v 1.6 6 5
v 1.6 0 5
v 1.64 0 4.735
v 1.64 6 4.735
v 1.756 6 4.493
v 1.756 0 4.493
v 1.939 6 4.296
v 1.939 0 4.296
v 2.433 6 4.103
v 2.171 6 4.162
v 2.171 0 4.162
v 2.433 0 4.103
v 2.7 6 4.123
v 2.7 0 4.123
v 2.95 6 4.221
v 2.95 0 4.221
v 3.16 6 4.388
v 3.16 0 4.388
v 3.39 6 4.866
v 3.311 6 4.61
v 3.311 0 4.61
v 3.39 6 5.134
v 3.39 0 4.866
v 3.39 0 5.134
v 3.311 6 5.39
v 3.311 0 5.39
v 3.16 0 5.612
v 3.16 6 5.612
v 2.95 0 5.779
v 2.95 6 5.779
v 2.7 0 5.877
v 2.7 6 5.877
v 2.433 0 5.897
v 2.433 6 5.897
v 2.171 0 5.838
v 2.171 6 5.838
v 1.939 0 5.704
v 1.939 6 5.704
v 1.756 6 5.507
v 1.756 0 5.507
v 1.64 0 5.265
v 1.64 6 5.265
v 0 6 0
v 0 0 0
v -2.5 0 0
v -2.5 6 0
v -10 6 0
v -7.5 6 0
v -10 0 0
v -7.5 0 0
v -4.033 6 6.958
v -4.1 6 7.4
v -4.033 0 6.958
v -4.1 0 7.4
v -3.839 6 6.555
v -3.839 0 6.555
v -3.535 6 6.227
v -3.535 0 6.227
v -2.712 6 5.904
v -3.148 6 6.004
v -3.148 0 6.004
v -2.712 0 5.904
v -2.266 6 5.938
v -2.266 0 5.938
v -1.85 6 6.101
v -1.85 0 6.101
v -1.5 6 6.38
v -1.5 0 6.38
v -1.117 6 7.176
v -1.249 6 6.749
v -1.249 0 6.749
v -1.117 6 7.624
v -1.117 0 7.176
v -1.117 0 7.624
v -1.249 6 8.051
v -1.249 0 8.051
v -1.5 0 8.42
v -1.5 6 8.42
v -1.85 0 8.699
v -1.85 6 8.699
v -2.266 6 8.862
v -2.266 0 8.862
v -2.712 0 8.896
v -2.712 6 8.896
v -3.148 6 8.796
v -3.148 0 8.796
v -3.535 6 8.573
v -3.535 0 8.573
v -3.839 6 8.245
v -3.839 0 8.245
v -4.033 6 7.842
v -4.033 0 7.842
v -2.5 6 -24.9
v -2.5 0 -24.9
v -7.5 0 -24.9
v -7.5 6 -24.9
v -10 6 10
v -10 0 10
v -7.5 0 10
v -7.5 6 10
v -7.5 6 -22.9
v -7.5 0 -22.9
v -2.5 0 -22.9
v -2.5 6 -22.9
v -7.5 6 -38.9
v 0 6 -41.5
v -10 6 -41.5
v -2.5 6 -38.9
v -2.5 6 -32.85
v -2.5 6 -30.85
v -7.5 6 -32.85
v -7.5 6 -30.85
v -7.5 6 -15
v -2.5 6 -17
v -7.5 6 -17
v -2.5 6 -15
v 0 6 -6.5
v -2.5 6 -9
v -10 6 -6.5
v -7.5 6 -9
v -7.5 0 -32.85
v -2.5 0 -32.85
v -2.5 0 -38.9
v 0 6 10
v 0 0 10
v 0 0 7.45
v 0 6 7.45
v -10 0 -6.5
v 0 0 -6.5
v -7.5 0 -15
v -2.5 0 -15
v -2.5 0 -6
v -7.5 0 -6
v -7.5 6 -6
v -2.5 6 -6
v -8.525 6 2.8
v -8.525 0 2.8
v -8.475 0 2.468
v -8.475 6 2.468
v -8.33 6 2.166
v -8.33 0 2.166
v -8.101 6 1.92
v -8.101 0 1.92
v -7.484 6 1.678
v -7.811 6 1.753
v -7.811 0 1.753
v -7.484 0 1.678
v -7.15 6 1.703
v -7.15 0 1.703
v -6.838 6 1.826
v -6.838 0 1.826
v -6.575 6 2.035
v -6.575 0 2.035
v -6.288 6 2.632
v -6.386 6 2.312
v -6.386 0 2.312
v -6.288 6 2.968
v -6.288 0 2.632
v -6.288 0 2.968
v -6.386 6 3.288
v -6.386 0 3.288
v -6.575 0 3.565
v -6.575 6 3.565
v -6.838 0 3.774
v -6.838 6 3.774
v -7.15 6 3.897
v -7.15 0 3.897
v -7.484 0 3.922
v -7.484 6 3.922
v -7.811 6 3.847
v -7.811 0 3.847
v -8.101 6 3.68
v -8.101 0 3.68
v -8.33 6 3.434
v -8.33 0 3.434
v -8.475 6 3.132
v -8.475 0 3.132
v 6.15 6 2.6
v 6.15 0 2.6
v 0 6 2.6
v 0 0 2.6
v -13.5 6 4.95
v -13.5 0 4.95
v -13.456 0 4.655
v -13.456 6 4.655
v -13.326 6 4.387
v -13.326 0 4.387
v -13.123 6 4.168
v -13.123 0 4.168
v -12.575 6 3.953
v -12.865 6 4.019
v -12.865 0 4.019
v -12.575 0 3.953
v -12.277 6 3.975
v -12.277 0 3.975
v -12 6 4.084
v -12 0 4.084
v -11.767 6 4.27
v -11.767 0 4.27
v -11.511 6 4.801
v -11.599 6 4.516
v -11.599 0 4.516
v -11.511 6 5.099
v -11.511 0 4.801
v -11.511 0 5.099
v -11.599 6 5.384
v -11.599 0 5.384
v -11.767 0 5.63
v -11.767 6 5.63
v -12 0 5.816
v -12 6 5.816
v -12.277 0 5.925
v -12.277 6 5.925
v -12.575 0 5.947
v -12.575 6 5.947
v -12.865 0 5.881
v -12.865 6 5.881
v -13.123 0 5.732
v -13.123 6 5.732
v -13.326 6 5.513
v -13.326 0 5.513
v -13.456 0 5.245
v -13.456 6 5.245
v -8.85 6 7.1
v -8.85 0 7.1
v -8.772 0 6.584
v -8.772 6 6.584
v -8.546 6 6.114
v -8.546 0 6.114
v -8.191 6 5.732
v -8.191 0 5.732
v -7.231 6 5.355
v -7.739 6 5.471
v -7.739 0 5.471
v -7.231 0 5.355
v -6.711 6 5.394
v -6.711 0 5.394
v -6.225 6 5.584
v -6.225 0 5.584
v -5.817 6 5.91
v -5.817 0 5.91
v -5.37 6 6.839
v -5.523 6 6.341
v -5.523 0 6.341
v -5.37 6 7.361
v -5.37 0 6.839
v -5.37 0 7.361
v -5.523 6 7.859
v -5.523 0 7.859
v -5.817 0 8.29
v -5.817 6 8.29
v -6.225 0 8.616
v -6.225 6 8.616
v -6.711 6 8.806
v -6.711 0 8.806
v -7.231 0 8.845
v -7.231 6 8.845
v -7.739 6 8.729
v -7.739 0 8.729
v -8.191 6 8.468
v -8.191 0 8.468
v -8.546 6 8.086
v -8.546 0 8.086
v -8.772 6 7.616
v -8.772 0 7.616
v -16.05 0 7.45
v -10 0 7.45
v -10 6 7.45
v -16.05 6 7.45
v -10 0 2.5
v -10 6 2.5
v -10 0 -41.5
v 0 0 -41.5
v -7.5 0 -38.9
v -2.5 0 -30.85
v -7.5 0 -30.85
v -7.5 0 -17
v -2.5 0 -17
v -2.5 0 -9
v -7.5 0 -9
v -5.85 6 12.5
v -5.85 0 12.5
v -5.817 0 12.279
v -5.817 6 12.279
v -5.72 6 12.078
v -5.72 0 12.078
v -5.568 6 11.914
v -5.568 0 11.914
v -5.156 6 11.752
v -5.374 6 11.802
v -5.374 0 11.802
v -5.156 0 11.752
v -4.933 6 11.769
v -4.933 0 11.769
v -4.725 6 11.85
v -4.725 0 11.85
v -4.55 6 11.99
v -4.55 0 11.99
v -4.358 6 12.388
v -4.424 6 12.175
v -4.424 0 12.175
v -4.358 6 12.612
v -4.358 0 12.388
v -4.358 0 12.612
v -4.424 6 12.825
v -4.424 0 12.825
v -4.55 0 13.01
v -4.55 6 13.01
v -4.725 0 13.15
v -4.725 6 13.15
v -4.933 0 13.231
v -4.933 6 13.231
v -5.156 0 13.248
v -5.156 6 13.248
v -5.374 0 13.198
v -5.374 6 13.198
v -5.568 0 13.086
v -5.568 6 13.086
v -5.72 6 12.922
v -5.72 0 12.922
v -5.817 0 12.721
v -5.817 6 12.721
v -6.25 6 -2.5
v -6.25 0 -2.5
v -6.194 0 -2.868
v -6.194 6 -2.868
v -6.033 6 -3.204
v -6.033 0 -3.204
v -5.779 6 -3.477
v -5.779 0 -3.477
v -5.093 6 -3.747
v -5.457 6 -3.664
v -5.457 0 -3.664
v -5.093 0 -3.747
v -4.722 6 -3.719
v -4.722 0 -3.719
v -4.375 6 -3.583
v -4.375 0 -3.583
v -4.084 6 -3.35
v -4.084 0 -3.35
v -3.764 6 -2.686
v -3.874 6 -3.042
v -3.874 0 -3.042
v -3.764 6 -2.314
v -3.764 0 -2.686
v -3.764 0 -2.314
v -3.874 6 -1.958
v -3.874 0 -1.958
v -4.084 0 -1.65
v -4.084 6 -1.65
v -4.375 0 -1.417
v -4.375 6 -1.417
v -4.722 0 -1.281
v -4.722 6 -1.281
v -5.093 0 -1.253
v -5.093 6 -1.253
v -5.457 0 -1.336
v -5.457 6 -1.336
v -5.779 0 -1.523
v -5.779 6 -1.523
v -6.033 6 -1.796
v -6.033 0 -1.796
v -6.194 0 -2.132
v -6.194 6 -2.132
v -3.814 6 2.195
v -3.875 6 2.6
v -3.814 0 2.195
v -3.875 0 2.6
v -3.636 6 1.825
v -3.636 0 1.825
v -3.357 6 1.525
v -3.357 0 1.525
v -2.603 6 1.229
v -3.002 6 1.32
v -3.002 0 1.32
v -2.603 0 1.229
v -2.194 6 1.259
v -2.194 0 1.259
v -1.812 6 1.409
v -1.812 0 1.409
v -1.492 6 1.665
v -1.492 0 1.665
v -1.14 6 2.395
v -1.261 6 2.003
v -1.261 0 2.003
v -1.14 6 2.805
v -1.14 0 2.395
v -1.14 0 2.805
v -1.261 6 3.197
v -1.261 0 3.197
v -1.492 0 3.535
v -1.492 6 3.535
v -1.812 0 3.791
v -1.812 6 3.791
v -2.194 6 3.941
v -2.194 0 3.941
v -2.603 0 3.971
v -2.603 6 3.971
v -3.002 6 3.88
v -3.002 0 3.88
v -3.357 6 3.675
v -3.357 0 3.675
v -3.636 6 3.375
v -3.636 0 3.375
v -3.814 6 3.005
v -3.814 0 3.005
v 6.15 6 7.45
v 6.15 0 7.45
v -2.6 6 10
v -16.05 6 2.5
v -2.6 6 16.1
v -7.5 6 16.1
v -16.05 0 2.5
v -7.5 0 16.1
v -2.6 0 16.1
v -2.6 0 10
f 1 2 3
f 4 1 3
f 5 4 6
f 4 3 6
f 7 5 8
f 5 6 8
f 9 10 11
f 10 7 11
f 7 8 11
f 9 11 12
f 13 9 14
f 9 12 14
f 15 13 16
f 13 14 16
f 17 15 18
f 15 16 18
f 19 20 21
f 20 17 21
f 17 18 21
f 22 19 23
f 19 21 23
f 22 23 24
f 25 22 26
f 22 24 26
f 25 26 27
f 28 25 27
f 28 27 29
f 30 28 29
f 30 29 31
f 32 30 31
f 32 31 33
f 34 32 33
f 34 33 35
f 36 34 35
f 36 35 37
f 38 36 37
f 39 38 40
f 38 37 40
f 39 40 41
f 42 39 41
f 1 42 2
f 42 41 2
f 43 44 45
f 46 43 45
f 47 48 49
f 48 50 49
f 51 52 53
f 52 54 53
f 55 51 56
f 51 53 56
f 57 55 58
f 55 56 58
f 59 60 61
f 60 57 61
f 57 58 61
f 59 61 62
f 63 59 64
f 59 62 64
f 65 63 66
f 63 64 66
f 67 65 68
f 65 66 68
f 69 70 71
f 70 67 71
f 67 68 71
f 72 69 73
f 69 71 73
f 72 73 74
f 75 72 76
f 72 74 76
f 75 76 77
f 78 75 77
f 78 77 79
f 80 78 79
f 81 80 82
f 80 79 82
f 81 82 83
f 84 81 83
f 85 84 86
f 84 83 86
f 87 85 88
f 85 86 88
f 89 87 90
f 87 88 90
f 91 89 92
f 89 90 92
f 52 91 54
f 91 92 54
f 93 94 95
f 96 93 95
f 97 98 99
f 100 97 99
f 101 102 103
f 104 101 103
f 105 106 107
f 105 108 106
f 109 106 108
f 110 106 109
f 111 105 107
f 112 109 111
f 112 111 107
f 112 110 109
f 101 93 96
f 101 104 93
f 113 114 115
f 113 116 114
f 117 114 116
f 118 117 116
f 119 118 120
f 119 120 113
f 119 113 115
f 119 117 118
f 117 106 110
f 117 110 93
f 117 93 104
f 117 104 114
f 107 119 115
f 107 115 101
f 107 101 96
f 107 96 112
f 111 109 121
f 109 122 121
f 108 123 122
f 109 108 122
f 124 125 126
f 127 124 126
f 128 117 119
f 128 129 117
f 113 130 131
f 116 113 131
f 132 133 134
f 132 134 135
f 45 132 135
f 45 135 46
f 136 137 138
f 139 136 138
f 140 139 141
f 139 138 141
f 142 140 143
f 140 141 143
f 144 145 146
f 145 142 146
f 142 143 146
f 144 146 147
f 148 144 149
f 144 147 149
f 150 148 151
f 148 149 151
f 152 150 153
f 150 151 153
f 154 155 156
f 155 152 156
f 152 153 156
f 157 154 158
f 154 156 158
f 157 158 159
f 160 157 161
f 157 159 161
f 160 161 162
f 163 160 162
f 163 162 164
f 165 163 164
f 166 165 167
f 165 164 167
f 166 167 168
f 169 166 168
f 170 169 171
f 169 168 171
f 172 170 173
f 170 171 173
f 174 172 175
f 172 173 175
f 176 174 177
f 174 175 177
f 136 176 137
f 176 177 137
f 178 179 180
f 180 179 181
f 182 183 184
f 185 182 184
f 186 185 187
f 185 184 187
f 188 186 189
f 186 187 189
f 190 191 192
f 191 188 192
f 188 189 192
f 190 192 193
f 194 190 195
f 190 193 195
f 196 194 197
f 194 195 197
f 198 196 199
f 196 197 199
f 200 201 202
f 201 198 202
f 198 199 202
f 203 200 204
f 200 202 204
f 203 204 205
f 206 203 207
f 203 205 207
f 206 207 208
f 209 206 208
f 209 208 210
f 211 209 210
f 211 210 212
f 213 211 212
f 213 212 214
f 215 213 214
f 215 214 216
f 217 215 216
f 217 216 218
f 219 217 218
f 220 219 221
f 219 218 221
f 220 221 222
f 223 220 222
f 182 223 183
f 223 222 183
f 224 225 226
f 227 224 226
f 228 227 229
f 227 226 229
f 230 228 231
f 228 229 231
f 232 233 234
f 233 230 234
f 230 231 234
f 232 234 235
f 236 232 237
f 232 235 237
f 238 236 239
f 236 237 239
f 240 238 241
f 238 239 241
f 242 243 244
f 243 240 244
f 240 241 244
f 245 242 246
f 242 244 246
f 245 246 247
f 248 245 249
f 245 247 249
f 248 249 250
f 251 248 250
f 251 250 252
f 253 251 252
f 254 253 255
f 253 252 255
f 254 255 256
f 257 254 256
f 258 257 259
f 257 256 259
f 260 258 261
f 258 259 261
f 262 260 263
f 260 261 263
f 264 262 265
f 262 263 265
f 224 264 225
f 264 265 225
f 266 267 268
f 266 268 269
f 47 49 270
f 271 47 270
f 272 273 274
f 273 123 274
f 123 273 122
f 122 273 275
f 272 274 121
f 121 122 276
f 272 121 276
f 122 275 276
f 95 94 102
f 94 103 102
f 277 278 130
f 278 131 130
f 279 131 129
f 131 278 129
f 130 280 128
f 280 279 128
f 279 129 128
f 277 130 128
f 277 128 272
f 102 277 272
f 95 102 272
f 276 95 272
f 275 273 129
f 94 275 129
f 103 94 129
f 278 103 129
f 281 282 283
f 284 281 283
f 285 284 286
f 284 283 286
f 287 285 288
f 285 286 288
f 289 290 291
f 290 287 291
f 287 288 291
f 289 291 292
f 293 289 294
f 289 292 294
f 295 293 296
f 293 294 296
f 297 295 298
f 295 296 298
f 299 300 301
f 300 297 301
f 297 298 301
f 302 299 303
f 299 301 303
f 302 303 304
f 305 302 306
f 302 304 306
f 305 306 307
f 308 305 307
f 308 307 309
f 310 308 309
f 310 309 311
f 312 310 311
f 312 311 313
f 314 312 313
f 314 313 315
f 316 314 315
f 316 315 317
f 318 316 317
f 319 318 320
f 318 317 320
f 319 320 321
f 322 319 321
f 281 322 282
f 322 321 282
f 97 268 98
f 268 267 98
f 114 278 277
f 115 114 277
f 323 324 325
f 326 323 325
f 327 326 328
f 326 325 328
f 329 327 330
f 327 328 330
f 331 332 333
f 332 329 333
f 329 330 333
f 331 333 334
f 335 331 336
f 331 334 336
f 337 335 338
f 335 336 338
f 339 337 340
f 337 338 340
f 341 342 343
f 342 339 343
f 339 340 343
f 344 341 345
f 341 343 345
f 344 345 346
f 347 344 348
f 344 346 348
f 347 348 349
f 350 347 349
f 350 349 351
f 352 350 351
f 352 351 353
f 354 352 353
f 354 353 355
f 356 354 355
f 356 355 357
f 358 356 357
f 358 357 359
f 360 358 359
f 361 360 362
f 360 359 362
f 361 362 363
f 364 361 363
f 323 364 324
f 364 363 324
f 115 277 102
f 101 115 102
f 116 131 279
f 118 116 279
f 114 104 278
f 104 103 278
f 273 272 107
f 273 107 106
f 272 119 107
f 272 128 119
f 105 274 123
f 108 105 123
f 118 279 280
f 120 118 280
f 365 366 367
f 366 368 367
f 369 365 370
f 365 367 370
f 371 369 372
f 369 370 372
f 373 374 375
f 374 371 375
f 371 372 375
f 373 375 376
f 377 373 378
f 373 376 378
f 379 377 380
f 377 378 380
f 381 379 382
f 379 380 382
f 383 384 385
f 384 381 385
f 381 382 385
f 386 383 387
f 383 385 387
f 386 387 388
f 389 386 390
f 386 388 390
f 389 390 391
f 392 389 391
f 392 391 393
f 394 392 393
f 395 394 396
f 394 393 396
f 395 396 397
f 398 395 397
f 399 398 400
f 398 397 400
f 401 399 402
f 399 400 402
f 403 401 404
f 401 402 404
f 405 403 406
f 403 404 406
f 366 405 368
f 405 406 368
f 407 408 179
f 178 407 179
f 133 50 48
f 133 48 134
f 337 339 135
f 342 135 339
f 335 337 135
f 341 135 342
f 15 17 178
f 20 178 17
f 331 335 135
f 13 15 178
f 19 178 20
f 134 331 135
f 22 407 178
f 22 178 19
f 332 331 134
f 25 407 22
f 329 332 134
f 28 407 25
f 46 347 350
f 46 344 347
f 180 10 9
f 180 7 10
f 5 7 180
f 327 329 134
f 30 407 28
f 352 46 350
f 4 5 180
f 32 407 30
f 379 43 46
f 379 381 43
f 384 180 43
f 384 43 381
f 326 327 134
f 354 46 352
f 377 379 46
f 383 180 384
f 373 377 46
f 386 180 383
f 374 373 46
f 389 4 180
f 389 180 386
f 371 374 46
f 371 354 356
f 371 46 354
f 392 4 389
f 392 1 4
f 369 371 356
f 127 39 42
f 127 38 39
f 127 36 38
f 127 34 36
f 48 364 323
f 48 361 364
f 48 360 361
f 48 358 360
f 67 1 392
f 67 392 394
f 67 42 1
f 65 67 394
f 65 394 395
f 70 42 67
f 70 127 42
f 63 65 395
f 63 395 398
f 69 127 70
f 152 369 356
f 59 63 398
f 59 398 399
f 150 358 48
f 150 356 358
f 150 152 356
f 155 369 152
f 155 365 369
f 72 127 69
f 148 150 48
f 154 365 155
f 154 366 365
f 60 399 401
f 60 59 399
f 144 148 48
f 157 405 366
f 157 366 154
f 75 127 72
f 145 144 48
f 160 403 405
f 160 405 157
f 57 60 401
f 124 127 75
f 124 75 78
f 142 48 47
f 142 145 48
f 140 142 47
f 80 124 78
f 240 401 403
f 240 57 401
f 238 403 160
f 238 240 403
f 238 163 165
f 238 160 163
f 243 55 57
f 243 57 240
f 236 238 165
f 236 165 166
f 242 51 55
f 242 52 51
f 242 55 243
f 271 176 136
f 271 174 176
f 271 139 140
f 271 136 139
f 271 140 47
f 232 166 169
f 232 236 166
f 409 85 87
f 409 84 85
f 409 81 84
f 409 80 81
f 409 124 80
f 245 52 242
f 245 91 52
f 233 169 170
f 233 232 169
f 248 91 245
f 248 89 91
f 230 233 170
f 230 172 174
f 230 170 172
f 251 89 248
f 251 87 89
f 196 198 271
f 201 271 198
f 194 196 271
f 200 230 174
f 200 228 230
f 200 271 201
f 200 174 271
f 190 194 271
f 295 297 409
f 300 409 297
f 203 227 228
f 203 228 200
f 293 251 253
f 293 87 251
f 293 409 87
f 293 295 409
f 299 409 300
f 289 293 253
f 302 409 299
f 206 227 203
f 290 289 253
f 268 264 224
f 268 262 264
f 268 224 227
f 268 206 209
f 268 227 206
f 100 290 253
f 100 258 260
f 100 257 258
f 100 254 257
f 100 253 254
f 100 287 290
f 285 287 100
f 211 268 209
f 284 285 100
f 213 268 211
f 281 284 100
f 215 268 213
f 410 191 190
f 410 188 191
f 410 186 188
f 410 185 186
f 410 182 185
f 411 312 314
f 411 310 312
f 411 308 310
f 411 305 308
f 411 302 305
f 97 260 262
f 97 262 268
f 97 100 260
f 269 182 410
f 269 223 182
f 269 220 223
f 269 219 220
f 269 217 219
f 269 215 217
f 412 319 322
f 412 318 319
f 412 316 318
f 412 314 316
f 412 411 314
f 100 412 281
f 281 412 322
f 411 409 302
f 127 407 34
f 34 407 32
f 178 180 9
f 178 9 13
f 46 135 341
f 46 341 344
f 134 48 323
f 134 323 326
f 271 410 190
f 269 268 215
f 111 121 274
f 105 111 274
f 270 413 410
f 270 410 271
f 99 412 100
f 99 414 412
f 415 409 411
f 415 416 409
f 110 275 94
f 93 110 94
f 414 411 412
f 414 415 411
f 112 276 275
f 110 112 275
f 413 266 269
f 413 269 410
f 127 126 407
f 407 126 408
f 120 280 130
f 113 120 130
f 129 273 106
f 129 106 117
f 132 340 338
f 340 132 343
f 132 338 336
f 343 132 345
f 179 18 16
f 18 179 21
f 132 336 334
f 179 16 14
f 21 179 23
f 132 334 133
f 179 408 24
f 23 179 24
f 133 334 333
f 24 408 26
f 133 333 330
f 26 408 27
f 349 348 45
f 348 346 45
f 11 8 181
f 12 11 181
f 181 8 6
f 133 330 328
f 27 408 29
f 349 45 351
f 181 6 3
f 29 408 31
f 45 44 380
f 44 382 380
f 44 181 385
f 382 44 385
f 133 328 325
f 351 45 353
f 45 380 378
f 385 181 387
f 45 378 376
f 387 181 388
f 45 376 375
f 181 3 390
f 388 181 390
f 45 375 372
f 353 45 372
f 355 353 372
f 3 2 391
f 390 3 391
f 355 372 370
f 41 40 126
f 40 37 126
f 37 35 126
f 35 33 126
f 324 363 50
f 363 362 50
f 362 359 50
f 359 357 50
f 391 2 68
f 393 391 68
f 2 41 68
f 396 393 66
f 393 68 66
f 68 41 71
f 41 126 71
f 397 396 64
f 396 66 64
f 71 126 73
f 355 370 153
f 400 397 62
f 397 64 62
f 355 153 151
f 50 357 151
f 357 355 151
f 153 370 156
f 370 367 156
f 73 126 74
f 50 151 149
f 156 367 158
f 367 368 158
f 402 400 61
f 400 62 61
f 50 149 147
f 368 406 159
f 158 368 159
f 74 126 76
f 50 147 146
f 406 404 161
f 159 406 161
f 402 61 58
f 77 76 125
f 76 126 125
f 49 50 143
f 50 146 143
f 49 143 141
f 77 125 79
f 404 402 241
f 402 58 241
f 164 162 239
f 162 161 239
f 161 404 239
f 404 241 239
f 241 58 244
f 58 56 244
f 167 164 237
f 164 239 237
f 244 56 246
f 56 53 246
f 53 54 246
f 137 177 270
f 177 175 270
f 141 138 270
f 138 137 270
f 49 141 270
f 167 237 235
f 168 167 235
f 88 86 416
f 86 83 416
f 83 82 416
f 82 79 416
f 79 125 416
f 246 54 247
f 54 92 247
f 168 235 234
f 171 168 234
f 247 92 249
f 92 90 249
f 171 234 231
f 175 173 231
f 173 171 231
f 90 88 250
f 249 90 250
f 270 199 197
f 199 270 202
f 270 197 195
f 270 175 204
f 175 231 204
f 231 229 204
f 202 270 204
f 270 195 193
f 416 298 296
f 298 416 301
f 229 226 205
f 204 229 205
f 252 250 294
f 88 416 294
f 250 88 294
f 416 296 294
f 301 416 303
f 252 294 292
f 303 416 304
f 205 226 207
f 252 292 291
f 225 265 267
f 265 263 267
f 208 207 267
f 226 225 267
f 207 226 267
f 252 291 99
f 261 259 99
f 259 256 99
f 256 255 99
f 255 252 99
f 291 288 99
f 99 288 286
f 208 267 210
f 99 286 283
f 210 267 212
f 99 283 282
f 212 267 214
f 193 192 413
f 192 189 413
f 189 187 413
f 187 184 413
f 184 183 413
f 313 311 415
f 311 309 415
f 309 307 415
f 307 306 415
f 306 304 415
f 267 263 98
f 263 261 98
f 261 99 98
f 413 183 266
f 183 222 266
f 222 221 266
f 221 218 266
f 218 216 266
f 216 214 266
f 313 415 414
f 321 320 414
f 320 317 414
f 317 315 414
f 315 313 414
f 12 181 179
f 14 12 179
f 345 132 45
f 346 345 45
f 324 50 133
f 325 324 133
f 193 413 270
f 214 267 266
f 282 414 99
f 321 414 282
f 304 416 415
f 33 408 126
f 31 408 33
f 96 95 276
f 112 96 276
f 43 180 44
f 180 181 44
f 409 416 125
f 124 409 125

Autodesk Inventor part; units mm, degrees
ref_plane "YZ Plane" through (0, 0, 0) normal (1, 0, 0) x (0, 1, 0)
ref_plane "XZ Plane" through (0, 0, 0) normal (0, 1, 0) x (-1, 0, 0)
ref_plane "XY Plane" through (0, 0, 0) normal (0, 0, 1) x (1, 0, 0)
sketch "Sketch1" plane through (0, 0, 0) normal (0, 1, 0) x (-1, 0, 0)
  line L0 (0, 0) -> (10, 0)
  line L1 (10, 0) -> (10, 10)
  line L2 (10, 10) -> (0, 10)
  line L3 (0, 10) -> (0, 0)
  line L4 (0, -6.5) -> (10, -6.5)
  line L5 (10, -6.5) -> (10, -41.5)
  line L6 (10, -41.5) -> (0, -41.5)
  line L7 (0, -41.5) -> (0, -6.5)
  line L8 (2.5, -9) -> (7.5, -9)
  line L9 (7.5, -9) -> (7.5, -15)
  line L10 (7.5, -15) -> (2.5, -15)
  line L11 (2.5, -15) -> (2.5, -9)
  line L12 (2.5, 0) -> (7.5, 0)
  line L13 (7.5, 0) -> (7.5, -6)
  line L14 (7.5, -6) -> (2.5, -6)
  line L15 (2.5, -6) -> (2.5, 0)
  line L16 (10, 7.45) -> (16.05, 7.45)
  line L17 (16.05, 7.45) -> (16.05, 2.5)
  line L18 (16.05, 2.5) -> (10, 2.5)
  line L19 (10, 2.5) -> (10, 7.45)
  line L20 (7.5, 10) -> (2.6, 10)
  line L21 (2.6, 10) -> (2.6, 16.1)
  line L22 (2.6, 16.1) -> (7.5, 16.1)
  line L23 (7.5, 16.1) -> (7.5, 10)
  line L24 (0, 7.45) -> (-6.15, 7.45)
  line L25 (-6.15, 7.45) -> (-6.15, 2.6)
  line L26 (-6.15, 2.6) -> (0, 2.6)
  line L27 (0, 2.6) -> (0, 7.45)
  circle A0 centre (5.1, 12.5) radius 0.75
  circle A1 centre (-2.5, 5) radius 0.9
  circle A2 centre (12.5, 4.95) radius 1
  circle A3 centre (5, -2.5) radius 1.25
  circle A4 centre (2.6, 7.4) radius 1.5
  circle A5 centre (7.1, 7.1) radius 1.75
  circle A6 centre (7.4, 2.8) radius 1.125
  circle A7 centre (2.5, 2.6) radius 1.375
  line L28 (2.5, -24.9) -> (7.5, -24.9)
  line L29 (7.5, -24.9) -> (7.5, -30.85)
  line L30 (7.5, -30.85) -> (2.5, -30.85)
  line L31 (2.5, -30.85) -> (2.5, -24.9)
  line L32 (2.5, -17) -> (7.5, -17)
  line L33 (7.5, -17) -> (7.5, -22.9)
  line L34 (7.5, -22.9) -> (2.5, -22.9)
  line L35 (2.5, -22.9) -> (2.5, -17)
  line L36 (2.5, -32.85) -> (7.5, -32.85)
  line L37 (7.5, -32.85) -> (7.5, -38.9)
  line L38 (7.5, -38.9) -> (2.5, -38.9)
  line L39 (2.5, -38.9) -> (2.5, -32.85)
  dimension "d0" = 10
  dimension "d1" = 10
  dimension "d2" = 10
  dimension "d3" = 35
  dimension "d4" = 5
  dimension "d5" = 6
  dimension "d6" = 2.5
  dimension "d7" = 2.5
  dimension "d8" = 6.5
  dimension "d9" = 5
  dimension "d10" = 6
  dimension "d11" = 6.05
  dimension "d12" = 4.95
  dimension "d13" = 4.9
  dimension "d14" = 6.1
  dimension "d15" = 6.15
  dimension "d16" = 4.85
  dimension "d17" = 2.5
  dimension "d18" = 2.5
  dimension "d19" = 1.5
  dimension "d20" = 1.8
  dimension "d21" = 2
  dimension "d22" = 2.5
  dimension "d23" = 3
  dimension "d24" = 3.5
  dimension "d25" = 2.25
  dimension "d26" = 2.75
  dimension "d27" = 2.5
  dimension "d28" = 2.5
  dimension "d29" = 2.5
  dimension "d30" = 2.5
  dimension "d31" = 2.5
  dimension "d32" = 2.5
  dimension "d33" = 2.4
  dimension "d34" = 2.5
  dimension "d35" = 2.8
  dimension "d36" = 2.5
  dimension "d37" = 2.6
  dimension "d38" = 2.6
  dimension "d39" = 2.6
  dimension "d40" = 2.9
  dimension "d41" = 2.9
  dimension "d42" = 2.6
  dimension "d45" = 5
  dimension "d46" = 5.95
  dimension "d47" = 5
  dimension "d48" = 5.9
  dimension "d49" = 2
  dimension "d50" = 2
  dimension "d51" = 2
  dimension "d52" = 6.05
extrude "Extrusion1" add sketch "Sketch1" along normal blind 6
properties part number "test"
